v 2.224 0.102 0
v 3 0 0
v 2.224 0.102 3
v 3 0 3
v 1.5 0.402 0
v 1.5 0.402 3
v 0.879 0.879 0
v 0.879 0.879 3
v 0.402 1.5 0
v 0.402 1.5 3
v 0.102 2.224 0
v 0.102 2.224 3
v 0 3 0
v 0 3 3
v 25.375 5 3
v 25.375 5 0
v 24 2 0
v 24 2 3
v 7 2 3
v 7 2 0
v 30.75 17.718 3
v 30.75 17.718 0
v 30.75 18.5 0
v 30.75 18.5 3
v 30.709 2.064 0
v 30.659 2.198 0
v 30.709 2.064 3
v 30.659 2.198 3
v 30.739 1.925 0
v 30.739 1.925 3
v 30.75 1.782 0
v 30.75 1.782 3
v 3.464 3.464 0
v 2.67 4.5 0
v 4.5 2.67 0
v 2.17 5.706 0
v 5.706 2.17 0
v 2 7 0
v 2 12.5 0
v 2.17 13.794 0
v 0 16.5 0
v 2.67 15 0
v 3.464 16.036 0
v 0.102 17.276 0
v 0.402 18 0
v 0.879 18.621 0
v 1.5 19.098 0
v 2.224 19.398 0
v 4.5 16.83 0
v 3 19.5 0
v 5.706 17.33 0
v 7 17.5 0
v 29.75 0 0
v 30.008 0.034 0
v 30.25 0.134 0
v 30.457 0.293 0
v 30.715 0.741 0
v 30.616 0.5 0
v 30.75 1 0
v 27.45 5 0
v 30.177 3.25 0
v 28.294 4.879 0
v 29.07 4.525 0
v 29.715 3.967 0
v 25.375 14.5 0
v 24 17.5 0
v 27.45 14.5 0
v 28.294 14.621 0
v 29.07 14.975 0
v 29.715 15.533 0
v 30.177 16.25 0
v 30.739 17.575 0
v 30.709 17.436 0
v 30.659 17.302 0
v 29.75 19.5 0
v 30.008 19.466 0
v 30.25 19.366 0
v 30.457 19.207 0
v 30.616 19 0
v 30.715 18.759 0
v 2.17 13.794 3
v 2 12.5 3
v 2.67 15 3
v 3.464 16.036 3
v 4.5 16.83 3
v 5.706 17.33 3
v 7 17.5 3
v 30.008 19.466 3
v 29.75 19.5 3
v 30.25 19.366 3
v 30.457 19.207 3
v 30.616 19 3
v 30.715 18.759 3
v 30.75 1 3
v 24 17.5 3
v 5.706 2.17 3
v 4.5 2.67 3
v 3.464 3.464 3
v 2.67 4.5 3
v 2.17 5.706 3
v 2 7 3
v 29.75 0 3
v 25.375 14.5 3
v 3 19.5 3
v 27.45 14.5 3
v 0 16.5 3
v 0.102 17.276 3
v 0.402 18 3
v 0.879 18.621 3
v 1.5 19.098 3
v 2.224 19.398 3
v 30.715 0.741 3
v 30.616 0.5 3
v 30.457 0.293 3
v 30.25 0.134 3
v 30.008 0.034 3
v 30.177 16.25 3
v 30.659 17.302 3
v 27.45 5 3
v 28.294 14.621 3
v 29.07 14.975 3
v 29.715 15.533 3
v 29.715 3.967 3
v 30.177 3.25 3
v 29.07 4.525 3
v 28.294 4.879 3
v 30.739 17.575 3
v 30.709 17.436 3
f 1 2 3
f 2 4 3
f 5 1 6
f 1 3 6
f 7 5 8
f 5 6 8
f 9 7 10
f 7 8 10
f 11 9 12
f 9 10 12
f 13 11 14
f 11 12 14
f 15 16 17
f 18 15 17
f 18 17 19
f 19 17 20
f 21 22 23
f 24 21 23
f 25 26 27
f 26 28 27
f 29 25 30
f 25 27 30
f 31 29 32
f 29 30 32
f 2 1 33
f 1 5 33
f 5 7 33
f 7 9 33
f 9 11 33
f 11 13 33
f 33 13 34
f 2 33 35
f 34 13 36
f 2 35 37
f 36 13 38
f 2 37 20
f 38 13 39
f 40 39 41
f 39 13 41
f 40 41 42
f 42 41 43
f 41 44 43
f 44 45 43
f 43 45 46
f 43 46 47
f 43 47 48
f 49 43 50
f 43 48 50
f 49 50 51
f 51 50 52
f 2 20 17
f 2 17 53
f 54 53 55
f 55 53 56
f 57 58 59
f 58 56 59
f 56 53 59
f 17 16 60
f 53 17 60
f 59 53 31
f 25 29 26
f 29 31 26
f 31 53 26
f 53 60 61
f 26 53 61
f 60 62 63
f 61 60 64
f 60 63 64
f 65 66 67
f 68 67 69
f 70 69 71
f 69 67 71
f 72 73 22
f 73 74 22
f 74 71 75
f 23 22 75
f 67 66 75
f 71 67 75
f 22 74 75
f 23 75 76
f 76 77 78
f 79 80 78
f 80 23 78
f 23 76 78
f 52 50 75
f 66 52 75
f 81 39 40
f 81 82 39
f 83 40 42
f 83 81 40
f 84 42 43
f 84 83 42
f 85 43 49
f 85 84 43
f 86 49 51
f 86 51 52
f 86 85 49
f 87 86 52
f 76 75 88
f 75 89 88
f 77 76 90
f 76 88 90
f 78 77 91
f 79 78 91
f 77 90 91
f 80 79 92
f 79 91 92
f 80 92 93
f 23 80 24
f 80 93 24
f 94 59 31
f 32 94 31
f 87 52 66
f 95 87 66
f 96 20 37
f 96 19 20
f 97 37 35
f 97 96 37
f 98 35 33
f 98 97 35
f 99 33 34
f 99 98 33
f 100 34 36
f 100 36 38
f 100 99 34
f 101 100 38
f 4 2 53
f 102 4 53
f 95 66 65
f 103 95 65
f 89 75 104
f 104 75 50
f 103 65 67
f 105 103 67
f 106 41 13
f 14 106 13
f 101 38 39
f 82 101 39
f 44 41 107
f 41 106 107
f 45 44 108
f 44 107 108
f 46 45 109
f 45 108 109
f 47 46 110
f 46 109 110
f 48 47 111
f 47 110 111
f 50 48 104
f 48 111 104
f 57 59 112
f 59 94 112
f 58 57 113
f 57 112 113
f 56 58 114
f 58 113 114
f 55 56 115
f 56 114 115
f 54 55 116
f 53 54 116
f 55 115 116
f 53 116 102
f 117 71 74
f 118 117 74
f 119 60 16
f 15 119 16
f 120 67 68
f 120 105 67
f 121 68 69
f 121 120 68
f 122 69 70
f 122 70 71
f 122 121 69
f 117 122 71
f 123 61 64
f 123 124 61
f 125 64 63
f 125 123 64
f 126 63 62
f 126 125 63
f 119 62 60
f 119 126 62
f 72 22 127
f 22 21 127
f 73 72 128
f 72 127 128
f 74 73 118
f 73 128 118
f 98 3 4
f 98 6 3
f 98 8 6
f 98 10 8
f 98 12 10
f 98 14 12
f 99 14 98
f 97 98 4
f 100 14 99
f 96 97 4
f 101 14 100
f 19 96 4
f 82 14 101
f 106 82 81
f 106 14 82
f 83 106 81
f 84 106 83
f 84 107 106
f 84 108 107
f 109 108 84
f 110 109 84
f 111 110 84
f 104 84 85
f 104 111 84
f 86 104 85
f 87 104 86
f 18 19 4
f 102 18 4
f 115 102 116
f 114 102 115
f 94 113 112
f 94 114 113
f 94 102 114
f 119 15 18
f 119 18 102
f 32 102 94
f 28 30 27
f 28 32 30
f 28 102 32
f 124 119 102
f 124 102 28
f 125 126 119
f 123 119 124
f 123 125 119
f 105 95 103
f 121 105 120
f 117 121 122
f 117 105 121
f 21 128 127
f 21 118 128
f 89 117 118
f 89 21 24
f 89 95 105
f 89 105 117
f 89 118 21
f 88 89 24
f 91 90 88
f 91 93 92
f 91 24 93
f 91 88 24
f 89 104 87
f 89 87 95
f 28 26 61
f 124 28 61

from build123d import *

# Parameters (mm, degrees)
PAD_DEPTH   = 3
FILLET_R    = 3
FILLET001_R = 1
FILLET002_R = 5
FILLET003_R = 3


with BuildPart() as part:
    # Sketch → Pad (new body)
    with BuildSketch(Plane.XY):
        Polygon((0, 0), (30.749545, 0), (30.749545, 2), (29.374773, 5), (25.374773, 5), (24, 2), (2, 2), (2, 17.5), (24, 17.5), (25.374773, 14.5), (29.374773, 14.5), (30.749545, 17.5), (30.749545, 19.5), (0, 19.5), align=None)
    extrude(amount=PAD_DEPTH)

    # Fillet
    fillet_edges = [part.edges().sort_by_distance(p)[0] for p in [
        (29.374773, 5, 1.5),
        (29.374773, 14.5, 1.5),
    ]]
    fillet(fillet_edges, radius=FILLET_R)

    # Fillet001
    fillet001_edges = [part.edges().sort_by_distance(p)[0] for p in [
        (30.749545, 2, 1.5),
        (30.749545, 0, 1.5),
        (30.749545, 19.5, 1.5),
        (30.749545, 17.5, 1.5),
    ]]
    fillet(fillet001_edges, radius=FILLET001_R)

    # Fillet002
    fillet002_edges = [part.edges().sort_by_distance(p)[0] for p in [
        (2, 2, 1.5),
        (2, 17.5, 1.5),
    ]]
    fillet(fillet002_edges, radius=FILLET002_R)

    # Fillet003
    fillet003_edges = [part.edges().sort_by_distance(p)[0] for p in [
        (0, 0, 1.5),
        (0, 19.5, 1.5),
    ]]
    fillet(fillet003_edges, radius=FILLET003_R)


solid = part.part
